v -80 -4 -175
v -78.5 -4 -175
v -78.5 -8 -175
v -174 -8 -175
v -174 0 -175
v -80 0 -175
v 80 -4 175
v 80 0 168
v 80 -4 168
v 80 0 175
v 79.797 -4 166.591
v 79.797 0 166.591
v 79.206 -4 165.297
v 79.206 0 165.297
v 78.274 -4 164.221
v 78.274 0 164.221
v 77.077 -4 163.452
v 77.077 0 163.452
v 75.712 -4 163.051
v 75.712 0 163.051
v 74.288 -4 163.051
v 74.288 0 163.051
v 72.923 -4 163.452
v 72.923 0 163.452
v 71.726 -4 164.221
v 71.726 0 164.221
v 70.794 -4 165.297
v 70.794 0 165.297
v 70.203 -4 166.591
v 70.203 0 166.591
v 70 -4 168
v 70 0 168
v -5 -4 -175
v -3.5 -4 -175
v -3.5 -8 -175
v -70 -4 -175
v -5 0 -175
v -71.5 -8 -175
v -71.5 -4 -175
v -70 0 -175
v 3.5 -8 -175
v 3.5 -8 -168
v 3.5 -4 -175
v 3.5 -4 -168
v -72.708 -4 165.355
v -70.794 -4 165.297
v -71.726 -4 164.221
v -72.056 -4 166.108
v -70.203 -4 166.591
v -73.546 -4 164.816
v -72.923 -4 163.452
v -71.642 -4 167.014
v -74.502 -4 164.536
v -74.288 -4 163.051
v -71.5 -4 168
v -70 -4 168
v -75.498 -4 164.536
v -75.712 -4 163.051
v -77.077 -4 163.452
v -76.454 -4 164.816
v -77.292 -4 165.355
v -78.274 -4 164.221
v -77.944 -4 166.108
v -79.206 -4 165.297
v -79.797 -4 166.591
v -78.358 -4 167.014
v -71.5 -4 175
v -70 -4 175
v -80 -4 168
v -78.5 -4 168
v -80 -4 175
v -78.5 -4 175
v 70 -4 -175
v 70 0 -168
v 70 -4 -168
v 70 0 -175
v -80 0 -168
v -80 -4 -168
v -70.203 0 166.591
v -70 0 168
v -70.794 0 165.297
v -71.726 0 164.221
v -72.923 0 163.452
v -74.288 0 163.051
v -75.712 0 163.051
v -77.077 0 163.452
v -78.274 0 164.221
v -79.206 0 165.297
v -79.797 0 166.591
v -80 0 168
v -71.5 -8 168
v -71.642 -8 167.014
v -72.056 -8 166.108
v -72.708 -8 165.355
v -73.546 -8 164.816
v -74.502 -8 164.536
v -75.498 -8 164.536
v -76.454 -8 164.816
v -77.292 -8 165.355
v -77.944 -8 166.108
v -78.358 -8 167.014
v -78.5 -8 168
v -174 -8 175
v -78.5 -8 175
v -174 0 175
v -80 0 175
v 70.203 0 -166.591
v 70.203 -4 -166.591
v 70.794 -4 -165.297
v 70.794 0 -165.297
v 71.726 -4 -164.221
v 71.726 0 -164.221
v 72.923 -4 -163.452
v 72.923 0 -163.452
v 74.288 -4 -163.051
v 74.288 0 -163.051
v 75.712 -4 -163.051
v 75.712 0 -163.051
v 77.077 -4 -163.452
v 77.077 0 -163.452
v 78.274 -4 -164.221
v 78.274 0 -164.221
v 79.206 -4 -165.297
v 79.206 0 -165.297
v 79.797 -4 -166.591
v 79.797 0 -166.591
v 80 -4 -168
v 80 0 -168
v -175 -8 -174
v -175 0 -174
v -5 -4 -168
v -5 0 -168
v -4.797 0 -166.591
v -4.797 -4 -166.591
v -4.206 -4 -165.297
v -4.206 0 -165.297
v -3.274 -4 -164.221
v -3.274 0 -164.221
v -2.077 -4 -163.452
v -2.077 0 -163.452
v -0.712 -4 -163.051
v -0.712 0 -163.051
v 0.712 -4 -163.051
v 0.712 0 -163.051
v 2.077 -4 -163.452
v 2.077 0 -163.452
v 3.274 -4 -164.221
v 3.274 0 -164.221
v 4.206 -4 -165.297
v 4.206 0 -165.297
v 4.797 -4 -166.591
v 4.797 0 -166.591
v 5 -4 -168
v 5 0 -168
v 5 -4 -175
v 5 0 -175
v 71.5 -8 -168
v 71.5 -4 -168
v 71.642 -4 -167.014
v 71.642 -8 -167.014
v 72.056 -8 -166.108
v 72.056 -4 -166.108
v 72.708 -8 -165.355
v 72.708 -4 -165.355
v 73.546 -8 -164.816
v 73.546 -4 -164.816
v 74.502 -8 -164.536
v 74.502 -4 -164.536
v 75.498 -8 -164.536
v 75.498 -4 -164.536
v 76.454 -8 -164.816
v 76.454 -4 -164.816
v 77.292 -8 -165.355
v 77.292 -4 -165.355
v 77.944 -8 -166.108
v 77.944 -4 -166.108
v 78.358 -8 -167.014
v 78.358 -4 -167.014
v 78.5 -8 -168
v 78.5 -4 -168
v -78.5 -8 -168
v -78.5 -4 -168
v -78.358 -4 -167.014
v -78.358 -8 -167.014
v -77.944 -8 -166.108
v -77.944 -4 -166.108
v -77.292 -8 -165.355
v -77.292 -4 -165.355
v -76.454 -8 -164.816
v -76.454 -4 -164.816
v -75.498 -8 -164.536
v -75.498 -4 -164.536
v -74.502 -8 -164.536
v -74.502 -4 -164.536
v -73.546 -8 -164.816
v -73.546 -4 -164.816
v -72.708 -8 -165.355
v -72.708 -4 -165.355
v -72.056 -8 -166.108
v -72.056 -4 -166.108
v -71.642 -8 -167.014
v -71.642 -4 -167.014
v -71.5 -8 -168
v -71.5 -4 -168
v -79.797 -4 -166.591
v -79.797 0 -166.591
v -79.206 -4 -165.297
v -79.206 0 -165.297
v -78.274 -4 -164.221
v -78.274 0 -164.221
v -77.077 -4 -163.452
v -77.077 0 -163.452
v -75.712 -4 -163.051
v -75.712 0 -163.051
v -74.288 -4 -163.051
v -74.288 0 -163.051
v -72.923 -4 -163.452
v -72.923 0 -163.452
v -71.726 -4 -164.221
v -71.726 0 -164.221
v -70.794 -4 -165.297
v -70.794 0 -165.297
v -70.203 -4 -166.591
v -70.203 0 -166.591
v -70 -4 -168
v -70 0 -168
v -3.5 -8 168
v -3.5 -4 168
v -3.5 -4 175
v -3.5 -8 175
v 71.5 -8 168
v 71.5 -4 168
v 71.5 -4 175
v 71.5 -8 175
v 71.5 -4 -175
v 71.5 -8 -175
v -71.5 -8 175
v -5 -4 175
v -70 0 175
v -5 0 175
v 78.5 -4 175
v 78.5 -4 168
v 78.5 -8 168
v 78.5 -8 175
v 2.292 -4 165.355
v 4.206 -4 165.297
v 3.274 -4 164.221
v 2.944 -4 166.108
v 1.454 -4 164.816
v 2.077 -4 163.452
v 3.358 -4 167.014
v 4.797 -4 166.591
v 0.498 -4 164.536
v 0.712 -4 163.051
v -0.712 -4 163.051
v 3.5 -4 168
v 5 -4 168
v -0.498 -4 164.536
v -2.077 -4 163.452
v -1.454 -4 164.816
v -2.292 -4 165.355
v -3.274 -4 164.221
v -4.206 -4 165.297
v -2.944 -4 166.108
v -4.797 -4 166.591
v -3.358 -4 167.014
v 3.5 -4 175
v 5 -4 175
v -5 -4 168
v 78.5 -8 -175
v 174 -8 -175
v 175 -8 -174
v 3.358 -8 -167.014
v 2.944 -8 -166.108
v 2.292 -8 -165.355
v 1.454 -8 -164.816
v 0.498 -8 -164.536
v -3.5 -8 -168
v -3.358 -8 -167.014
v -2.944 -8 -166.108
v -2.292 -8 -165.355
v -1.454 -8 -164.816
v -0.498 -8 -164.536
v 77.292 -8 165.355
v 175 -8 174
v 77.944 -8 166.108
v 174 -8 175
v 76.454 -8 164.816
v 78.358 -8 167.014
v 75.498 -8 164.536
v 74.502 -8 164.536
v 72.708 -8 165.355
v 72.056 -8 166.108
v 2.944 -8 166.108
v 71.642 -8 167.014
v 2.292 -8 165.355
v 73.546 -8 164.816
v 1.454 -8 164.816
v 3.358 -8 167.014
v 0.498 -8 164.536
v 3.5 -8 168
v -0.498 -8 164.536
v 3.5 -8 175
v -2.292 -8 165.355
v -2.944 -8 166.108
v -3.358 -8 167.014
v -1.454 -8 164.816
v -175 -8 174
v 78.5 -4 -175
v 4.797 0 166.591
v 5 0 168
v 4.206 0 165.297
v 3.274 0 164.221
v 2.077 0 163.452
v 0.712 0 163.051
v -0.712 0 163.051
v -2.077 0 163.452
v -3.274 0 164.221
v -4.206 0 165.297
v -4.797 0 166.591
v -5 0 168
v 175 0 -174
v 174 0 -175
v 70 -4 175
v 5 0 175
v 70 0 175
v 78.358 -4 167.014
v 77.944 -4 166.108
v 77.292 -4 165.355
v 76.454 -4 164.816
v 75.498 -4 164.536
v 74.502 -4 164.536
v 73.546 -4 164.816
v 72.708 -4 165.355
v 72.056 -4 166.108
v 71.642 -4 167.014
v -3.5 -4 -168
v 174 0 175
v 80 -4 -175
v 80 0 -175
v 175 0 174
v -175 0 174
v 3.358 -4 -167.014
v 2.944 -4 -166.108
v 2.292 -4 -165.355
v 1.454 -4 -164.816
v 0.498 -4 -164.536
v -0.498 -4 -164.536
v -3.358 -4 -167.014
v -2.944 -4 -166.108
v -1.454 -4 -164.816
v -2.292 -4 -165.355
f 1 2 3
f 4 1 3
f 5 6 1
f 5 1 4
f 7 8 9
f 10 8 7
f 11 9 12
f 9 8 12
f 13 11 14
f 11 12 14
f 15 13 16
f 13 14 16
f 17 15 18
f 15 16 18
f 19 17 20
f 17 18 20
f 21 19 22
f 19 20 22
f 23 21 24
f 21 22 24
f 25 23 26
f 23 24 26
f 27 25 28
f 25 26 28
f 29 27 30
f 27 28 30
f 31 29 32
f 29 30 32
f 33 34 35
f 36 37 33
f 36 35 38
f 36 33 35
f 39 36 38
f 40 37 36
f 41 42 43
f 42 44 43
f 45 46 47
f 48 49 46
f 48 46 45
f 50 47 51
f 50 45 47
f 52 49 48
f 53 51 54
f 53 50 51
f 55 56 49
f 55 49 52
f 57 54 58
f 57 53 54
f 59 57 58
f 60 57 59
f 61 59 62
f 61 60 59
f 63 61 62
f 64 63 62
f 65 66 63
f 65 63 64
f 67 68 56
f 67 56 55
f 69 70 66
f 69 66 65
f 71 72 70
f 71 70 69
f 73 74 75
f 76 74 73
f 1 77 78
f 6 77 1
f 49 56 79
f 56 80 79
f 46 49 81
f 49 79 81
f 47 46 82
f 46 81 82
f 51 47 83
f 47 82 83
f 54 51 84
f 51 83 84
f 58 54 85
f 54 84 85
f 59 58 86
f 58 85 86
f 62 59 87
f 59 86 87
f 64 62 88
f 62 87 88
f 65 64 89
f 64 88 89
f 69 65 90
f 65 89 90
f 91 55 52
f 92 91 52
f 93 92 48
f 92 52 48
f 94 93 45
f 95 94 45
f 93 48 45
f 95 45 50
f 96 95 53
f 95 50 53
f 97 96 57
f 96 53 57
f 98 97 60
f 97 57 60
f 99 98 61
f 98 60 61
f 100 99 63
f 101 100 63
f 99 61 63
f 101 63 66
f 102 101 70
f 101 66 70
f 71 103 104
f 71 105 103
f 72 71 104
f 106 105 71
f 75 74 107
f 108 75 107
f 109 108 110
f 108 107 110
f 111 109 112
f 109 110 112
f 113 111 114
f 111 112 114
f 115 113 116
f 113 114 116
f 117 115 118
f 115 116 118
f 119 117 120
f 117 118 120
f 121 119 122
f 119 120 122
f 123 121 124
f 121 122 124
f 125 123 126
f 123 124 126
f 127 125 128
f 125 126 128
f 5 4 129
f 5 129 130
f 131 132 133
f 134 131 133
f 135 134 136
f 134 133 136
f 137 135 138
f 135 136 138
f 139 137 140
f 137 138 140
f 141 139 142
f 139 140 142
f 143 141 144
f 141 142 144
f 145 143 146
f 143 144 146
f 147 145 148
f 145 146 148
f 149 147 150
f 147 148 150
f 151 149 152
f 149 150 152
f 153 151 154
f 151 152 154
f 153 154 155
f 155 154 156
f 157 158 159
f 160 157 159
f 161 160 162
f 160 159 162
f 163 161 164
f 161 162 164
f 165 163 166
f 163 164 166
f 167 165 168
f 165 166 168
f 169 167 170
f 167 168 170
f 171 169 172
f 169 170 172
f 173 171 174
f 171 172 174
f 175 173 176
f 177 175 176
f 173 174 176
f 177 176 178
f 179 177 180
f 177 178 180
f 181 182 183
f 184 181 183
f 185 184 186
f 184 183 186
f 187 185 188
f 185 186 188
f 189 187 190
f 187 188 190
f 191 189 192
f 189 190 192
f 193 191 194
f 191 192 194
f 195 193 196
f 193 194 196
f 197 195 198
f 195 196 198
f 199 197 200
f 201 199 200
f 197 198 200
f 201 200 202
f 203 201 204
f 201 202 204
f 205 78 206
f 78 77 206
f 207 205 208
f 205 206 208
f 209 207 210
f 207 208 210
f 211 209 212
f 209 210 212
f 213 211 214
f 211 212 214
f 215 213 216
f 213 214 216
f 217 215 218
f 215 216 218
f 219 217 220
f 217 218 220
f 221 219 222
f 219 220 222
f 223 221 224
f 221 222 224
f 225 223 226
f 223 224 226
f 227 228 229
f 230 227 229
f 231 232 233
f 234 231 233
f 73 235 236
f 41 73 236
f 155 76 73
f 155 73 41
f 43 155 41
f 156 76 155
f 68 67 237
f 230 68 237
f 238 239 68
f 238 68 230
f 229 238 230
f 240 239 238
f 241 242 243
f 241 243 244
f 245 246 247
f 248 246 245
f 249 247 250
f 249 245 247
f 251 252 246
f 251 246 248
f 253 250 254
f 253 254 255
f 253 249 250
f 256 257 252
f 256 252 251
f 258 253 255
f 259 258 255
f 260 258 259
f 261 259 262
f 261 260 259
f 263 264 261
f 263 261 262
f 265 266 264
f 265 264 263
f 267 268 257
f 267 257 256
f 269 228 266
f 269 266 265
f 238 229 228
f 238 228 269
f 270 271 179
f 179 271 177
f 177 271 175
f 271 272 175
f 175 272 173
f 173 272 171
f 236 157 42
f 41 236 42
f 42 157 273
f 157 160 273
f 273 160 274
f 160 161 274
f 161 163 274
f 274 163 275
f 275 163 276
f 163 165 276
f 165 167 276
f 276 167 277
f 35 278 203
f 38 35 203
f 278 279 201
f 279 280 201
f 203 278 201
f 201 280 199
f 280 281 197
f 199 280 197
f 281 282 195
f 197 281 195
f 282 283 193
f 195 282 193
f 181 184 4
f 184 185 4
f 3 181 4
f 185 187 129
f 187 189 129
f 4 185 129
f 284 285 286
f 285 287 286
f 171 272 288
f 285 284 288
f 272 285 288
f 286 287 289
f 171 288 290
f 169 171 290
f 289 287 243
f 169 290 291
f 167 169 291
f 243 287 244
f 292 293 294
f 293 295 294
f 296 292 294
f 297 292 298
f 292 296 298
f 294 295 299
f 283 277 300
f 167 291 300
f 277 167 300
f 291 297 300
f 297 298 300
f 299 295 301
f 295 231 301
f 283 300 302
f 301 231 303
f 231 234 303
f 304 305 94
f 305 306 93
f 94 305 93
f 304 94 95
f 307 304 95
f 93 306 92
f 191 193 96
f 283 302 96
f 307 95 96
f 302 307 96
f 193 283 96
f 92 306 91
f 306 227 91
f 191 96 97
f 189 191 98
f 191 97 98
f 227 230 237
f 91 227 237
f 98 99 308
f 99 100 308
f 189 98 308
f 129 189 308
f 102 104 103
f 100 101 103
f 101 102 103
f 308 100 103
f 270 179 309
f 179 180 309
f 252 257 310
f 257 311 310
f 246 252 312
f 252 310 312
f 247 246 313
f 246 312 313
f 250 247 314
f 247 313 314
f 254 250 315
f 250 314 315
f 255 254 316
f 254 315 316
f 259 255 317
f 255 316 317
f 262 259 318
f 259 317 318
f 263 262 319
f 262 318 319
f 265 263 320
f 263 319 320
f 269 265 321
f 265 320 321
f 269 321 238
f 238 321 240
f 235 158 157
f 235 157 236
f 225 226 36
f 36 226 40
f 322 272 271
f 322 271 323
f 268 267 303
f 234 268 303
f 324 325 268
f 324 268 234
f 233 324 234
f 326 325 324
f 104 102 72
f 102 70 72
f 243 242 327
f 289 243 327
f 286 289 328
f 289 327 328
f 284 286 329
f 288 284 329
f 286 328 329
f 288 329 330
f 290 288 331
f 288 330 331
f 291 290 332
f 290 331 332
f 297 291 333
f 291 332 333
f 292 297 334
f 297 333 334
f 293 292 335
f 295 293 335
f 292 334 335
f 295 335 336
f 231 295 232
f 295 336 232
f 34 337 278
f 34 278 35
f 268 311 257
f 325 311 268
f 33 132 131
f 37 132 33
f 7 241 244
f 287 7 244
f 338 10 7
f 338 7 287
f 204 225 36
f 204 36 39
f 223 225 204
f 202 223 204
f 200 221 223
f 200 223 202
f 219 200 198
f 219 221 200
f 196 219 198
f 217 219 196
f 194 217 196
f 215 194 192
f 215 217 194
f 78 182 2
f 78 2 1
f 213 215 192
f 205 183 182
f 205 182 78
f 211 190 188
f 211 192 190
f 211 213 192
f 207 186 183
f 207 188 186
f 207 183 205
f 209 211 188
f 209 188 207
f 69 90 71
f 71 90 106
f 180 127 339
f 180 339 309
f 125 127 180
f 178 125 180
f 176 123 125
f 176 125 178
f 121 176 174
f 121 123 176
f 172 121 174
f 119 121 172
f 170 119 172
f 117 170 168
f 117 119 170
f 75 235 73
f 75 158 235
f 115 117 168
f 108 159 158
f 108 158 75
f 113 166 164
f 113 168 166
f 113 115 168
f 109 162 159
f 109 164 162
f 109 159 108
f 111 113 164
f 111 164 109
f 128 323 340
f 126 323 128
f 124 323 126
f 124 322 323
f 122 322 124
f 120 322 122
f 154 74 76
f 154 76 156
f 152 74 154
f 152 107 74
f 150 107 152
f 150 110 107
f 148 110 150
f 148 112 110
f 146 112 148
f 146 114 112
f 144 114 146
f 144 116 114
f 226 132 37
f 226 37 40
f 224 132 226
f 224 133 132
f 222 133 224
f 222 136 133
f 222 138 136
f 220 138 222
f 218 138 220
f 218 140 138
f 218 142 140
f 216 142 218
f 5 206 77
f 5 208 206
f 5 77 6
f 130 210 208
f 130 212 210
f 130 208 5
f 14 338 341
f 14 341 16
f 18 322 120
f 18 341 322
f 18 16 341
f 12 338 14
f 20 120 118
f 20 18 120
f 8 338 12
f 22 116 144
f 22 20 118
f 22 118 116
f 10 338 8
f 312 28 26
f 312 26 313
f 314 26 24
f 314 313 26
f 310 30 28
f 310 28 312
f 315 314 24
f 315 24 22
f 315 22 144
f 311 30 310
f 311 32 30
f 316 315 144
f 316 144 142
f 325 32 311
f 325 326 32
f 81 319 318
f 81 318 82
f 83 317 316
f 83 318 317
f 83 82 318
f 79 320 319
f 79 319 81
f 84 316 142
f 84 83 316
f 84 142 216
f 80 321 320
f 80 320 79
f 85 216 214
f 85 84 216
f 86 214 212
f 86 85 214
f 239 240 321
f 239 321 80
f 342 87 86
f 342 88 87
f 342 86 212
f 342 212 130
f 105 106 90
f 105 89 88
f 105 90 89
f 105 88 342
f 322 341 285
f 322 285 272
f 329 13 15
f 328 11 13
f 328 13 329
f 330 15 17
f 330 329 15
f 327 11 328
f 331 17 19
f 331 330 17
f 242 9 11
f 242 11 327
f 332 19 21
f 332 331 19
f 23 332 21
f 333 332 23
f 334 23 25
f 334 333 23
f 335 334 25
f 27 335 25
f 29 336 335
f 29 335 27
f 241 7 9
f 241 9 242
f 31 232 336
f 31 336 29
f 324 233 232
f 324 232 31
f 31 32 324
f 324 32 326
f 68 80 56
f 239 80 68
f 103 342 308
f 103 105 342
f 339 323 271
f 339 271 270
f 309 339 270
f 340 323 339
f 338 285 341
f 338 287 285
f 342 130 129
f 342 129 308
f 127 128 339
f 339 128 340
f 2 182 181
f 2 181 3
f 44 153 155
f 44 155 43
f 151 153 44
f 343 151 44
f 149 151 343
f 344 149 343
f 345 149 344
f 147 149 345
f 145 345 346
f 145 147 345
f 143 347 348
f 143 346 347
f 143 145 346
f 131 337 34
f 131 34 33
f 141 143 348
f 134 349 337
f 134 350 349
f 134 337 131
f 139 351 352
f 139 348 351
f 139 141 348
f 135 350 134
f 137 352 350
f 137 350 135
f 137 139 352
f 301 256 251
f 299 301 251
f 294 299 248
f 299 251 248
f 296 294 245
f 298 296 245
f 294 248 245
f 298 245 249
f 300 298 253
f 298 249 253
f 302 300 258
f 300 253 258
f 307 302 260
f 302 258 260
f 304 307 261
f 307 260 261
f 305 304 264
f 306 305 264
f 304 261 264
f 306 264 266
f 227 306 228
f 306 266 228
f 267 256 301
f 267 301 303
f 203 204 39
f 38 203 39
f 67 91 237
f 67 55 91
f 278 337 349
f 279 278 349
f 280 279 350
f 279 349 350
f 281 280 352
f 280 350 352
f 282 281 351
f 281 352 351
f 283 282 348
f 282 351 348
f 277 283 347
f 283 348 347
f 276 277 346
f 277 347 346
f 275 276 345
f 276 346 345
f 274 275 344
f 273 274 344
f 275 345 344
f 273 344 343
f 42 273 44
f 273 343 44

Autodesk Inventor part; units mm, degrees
ref_plane "YZ Plane" through (0, 0, 0) normal (1, 0, 0) x (0, 1, 0)
ref_plane "XZ Plane" through (0, 0, 0) normal (0, 1, 0) x (-1, 0, 0)
ref_plane "XY Plane" through (0, 0, 0) normal (0, 0, 1) x (1, 0, 0)
sketch "Skizze1" plane through (0, 0, 0) normal (0, 1, 0) x (-1, 0, 0)
  line L0 (175, 175) -> (-175, 175)
  line L1 (-175, 175) -> (-175, -175)
  line L2 (-175, -175) -> (175, -175)
  line L3 (175, -175) -> (175, 175)
  line L4 (175, 175) -> (-175, -175) construction
  line L5 (-175, 175) -> (175, -175) construction
  circle A0 centre (75, -168) radius 3.5
  line L6 (78.5, -168) -> (78.5, -175)
  line L7 (71.5, -168) -> (71.5, -175)
  circle A1 centre (-75, -168) radius 3.5
  line L8 (-71.5, -168) -> (-71.5, -175)
  line L9 (-78.5, -168) -> (-78.5, -175)
  circle A2 centre (0, -168) radius 3.5
  line L10 (3.5, -168) -> (3.5, -175)
  line L11 (-3.5, -168) -> (-3.5, -175)
  line L12 (245, 0) -> (-245, 0) construction
  line L13 (0, -245) -> (0, 245) construction
  circle A3 centre (0, -168) radius 5
  line L14 (5, -168) -> (5, -175)
  line L15 (-5, -168) -> (-5, -175)
  line L16 (3.5, -175) -> (-3.5, -175)
  line L17 (-5, -175) -> (5, -175)
  circle A4 centre (75, -168) radius 5
  circle A5 centre (-75, -168) radius 5
  line L18 (80, -168) -> (80, -175)
  line L19 (70, -168) -> (70, -175)
  line L20 (78.5, -175) -> (71.5, -175)
  line L21 (70, -175) -> (80, -175)
  line L22 (-80, -168) -> (-80, -175)
  line L23 (-70, -168) -> (-70, -175)
  line L24 (-70, -175) -> (-80, -175)
  line L25 (-78.5, -175) -> (-71.5, -175)
  circle A6 centre (75, 168) radius 3.5
  line L26 (78.5, 168) -> (78.5, 175)
  line L27 (71.5, 168) -> (71.5, 175)
  circle A7 centre (-75, 168) radius 3.5
  line L28 (-71.5, 168) -> (-71.5, 175)
  line L29 (-78.5, 168) -> (-78.5, 175)
  circle A8 centre (0, 168) radius 3.5
  line L30 (3.5, 168) -> (3.5, 175)
  line L31 (-3.5, 168) -> (-3.5, 175)
  circle A9 centre (0, 168) radius 5
  line L32 (5, 168) -> (5, 175)
  line L33 (-5, 168) -> (-5, 175)
  line L34 (3.5, 175) -> (-3.5, 175)
  line L35 (-5, 175) -> (5, 175)
  circle A10 centre (75, 168) radius 5
  circle A11 centre (-75, 168) radius 5
  line L36 (80, 168) -> (80, 175)
  line L37 (70, 168) -> (70, 175)
  line L38 (78.5, 175) -> (71.5, 175)
  line L39 (70, 175) -> (80, 175)
  line L40 (-80, 168) -> (-80, 175)
  line L41 (-70, 168) -> (-70, 175)
  line L42 (-70, 175) -> (-80, 175)
  line L43 (-78.5, 175) -> (-71.5, 175)
  point P0 (0, 0)
  dimension "d0" = 350
  dimension "d1" = 350
  dimension "d3" = 7
  dimension "d4" = 150
  dimension "d5" = 7
  dimension "d6" = 10
extrude "Extrusion1" add sketch "Skizze1" against normal blind 8
extrude "Extrusion2" cut sketch "Skizze1" against normal through all contours L26 A10 L27 L0 | L26 A6 L27 A10 | L2 L7 A4 L6 | A6 | A4 L7 A0 L6 | A0 | L30 A9 L31 L0 | L30 A8 L31 A9 | L2 L11 A3 L10 | A8 | A3 L11 A2 L10 | A2 | L28 A11 L29 L0 | L28 A7 L29 A11 | L2 L9 A5 L8 | A7 | A5 L9 A1 L8 | A1 picked at (75.1406, 172.4711) picked at (75.1406, -172.4711) picked at (-0.1406, 172.4711) picked at (0.1406, -172.4711) picked at (-74.8594, 172.4711) picked at (-74.8594, -172.4711)
extrude "Extrusion3" cut sketch "Skizze1" against normal blind 4 contours L36 A10 L26 L0 | A10 L27 A6 L26 | L2 L6 A4 L18 | L27 A10 L37 L0 | A4 L6 A0 L7 | L2 L19 A4 L7 | L32 A9 L30 L0 | A9 L31 A8 L30 | L2 L10 A3 L14 | L31 A9 L33 L0 | A3 L10 A2 L11 | L2 L15 A3 L11 | L41 A11 L28 L0 | A11 L29 A7 L28 | L2 L8 A5 L23 | L29 A11 L40 L0 | A5 L8 A1 L9 | L2 L22 A5 L9 picked at (71.2879, 170.1266) picked at (71.2879, -170.1266) picked at (3.7121, 170.1266) picked at (-3.7121, -170.1266) picked at (-78.7121, 170.1266) picked at (-78.7121, -170.1266)
chamfer "Fase1" distance 1 angle 45 4 edges at (-175, -4, 175) (175, -4, 175) (175, -4, -175) (-175, -4, -175)
properties part number "Heatbed" material "Aluminium 6061"
